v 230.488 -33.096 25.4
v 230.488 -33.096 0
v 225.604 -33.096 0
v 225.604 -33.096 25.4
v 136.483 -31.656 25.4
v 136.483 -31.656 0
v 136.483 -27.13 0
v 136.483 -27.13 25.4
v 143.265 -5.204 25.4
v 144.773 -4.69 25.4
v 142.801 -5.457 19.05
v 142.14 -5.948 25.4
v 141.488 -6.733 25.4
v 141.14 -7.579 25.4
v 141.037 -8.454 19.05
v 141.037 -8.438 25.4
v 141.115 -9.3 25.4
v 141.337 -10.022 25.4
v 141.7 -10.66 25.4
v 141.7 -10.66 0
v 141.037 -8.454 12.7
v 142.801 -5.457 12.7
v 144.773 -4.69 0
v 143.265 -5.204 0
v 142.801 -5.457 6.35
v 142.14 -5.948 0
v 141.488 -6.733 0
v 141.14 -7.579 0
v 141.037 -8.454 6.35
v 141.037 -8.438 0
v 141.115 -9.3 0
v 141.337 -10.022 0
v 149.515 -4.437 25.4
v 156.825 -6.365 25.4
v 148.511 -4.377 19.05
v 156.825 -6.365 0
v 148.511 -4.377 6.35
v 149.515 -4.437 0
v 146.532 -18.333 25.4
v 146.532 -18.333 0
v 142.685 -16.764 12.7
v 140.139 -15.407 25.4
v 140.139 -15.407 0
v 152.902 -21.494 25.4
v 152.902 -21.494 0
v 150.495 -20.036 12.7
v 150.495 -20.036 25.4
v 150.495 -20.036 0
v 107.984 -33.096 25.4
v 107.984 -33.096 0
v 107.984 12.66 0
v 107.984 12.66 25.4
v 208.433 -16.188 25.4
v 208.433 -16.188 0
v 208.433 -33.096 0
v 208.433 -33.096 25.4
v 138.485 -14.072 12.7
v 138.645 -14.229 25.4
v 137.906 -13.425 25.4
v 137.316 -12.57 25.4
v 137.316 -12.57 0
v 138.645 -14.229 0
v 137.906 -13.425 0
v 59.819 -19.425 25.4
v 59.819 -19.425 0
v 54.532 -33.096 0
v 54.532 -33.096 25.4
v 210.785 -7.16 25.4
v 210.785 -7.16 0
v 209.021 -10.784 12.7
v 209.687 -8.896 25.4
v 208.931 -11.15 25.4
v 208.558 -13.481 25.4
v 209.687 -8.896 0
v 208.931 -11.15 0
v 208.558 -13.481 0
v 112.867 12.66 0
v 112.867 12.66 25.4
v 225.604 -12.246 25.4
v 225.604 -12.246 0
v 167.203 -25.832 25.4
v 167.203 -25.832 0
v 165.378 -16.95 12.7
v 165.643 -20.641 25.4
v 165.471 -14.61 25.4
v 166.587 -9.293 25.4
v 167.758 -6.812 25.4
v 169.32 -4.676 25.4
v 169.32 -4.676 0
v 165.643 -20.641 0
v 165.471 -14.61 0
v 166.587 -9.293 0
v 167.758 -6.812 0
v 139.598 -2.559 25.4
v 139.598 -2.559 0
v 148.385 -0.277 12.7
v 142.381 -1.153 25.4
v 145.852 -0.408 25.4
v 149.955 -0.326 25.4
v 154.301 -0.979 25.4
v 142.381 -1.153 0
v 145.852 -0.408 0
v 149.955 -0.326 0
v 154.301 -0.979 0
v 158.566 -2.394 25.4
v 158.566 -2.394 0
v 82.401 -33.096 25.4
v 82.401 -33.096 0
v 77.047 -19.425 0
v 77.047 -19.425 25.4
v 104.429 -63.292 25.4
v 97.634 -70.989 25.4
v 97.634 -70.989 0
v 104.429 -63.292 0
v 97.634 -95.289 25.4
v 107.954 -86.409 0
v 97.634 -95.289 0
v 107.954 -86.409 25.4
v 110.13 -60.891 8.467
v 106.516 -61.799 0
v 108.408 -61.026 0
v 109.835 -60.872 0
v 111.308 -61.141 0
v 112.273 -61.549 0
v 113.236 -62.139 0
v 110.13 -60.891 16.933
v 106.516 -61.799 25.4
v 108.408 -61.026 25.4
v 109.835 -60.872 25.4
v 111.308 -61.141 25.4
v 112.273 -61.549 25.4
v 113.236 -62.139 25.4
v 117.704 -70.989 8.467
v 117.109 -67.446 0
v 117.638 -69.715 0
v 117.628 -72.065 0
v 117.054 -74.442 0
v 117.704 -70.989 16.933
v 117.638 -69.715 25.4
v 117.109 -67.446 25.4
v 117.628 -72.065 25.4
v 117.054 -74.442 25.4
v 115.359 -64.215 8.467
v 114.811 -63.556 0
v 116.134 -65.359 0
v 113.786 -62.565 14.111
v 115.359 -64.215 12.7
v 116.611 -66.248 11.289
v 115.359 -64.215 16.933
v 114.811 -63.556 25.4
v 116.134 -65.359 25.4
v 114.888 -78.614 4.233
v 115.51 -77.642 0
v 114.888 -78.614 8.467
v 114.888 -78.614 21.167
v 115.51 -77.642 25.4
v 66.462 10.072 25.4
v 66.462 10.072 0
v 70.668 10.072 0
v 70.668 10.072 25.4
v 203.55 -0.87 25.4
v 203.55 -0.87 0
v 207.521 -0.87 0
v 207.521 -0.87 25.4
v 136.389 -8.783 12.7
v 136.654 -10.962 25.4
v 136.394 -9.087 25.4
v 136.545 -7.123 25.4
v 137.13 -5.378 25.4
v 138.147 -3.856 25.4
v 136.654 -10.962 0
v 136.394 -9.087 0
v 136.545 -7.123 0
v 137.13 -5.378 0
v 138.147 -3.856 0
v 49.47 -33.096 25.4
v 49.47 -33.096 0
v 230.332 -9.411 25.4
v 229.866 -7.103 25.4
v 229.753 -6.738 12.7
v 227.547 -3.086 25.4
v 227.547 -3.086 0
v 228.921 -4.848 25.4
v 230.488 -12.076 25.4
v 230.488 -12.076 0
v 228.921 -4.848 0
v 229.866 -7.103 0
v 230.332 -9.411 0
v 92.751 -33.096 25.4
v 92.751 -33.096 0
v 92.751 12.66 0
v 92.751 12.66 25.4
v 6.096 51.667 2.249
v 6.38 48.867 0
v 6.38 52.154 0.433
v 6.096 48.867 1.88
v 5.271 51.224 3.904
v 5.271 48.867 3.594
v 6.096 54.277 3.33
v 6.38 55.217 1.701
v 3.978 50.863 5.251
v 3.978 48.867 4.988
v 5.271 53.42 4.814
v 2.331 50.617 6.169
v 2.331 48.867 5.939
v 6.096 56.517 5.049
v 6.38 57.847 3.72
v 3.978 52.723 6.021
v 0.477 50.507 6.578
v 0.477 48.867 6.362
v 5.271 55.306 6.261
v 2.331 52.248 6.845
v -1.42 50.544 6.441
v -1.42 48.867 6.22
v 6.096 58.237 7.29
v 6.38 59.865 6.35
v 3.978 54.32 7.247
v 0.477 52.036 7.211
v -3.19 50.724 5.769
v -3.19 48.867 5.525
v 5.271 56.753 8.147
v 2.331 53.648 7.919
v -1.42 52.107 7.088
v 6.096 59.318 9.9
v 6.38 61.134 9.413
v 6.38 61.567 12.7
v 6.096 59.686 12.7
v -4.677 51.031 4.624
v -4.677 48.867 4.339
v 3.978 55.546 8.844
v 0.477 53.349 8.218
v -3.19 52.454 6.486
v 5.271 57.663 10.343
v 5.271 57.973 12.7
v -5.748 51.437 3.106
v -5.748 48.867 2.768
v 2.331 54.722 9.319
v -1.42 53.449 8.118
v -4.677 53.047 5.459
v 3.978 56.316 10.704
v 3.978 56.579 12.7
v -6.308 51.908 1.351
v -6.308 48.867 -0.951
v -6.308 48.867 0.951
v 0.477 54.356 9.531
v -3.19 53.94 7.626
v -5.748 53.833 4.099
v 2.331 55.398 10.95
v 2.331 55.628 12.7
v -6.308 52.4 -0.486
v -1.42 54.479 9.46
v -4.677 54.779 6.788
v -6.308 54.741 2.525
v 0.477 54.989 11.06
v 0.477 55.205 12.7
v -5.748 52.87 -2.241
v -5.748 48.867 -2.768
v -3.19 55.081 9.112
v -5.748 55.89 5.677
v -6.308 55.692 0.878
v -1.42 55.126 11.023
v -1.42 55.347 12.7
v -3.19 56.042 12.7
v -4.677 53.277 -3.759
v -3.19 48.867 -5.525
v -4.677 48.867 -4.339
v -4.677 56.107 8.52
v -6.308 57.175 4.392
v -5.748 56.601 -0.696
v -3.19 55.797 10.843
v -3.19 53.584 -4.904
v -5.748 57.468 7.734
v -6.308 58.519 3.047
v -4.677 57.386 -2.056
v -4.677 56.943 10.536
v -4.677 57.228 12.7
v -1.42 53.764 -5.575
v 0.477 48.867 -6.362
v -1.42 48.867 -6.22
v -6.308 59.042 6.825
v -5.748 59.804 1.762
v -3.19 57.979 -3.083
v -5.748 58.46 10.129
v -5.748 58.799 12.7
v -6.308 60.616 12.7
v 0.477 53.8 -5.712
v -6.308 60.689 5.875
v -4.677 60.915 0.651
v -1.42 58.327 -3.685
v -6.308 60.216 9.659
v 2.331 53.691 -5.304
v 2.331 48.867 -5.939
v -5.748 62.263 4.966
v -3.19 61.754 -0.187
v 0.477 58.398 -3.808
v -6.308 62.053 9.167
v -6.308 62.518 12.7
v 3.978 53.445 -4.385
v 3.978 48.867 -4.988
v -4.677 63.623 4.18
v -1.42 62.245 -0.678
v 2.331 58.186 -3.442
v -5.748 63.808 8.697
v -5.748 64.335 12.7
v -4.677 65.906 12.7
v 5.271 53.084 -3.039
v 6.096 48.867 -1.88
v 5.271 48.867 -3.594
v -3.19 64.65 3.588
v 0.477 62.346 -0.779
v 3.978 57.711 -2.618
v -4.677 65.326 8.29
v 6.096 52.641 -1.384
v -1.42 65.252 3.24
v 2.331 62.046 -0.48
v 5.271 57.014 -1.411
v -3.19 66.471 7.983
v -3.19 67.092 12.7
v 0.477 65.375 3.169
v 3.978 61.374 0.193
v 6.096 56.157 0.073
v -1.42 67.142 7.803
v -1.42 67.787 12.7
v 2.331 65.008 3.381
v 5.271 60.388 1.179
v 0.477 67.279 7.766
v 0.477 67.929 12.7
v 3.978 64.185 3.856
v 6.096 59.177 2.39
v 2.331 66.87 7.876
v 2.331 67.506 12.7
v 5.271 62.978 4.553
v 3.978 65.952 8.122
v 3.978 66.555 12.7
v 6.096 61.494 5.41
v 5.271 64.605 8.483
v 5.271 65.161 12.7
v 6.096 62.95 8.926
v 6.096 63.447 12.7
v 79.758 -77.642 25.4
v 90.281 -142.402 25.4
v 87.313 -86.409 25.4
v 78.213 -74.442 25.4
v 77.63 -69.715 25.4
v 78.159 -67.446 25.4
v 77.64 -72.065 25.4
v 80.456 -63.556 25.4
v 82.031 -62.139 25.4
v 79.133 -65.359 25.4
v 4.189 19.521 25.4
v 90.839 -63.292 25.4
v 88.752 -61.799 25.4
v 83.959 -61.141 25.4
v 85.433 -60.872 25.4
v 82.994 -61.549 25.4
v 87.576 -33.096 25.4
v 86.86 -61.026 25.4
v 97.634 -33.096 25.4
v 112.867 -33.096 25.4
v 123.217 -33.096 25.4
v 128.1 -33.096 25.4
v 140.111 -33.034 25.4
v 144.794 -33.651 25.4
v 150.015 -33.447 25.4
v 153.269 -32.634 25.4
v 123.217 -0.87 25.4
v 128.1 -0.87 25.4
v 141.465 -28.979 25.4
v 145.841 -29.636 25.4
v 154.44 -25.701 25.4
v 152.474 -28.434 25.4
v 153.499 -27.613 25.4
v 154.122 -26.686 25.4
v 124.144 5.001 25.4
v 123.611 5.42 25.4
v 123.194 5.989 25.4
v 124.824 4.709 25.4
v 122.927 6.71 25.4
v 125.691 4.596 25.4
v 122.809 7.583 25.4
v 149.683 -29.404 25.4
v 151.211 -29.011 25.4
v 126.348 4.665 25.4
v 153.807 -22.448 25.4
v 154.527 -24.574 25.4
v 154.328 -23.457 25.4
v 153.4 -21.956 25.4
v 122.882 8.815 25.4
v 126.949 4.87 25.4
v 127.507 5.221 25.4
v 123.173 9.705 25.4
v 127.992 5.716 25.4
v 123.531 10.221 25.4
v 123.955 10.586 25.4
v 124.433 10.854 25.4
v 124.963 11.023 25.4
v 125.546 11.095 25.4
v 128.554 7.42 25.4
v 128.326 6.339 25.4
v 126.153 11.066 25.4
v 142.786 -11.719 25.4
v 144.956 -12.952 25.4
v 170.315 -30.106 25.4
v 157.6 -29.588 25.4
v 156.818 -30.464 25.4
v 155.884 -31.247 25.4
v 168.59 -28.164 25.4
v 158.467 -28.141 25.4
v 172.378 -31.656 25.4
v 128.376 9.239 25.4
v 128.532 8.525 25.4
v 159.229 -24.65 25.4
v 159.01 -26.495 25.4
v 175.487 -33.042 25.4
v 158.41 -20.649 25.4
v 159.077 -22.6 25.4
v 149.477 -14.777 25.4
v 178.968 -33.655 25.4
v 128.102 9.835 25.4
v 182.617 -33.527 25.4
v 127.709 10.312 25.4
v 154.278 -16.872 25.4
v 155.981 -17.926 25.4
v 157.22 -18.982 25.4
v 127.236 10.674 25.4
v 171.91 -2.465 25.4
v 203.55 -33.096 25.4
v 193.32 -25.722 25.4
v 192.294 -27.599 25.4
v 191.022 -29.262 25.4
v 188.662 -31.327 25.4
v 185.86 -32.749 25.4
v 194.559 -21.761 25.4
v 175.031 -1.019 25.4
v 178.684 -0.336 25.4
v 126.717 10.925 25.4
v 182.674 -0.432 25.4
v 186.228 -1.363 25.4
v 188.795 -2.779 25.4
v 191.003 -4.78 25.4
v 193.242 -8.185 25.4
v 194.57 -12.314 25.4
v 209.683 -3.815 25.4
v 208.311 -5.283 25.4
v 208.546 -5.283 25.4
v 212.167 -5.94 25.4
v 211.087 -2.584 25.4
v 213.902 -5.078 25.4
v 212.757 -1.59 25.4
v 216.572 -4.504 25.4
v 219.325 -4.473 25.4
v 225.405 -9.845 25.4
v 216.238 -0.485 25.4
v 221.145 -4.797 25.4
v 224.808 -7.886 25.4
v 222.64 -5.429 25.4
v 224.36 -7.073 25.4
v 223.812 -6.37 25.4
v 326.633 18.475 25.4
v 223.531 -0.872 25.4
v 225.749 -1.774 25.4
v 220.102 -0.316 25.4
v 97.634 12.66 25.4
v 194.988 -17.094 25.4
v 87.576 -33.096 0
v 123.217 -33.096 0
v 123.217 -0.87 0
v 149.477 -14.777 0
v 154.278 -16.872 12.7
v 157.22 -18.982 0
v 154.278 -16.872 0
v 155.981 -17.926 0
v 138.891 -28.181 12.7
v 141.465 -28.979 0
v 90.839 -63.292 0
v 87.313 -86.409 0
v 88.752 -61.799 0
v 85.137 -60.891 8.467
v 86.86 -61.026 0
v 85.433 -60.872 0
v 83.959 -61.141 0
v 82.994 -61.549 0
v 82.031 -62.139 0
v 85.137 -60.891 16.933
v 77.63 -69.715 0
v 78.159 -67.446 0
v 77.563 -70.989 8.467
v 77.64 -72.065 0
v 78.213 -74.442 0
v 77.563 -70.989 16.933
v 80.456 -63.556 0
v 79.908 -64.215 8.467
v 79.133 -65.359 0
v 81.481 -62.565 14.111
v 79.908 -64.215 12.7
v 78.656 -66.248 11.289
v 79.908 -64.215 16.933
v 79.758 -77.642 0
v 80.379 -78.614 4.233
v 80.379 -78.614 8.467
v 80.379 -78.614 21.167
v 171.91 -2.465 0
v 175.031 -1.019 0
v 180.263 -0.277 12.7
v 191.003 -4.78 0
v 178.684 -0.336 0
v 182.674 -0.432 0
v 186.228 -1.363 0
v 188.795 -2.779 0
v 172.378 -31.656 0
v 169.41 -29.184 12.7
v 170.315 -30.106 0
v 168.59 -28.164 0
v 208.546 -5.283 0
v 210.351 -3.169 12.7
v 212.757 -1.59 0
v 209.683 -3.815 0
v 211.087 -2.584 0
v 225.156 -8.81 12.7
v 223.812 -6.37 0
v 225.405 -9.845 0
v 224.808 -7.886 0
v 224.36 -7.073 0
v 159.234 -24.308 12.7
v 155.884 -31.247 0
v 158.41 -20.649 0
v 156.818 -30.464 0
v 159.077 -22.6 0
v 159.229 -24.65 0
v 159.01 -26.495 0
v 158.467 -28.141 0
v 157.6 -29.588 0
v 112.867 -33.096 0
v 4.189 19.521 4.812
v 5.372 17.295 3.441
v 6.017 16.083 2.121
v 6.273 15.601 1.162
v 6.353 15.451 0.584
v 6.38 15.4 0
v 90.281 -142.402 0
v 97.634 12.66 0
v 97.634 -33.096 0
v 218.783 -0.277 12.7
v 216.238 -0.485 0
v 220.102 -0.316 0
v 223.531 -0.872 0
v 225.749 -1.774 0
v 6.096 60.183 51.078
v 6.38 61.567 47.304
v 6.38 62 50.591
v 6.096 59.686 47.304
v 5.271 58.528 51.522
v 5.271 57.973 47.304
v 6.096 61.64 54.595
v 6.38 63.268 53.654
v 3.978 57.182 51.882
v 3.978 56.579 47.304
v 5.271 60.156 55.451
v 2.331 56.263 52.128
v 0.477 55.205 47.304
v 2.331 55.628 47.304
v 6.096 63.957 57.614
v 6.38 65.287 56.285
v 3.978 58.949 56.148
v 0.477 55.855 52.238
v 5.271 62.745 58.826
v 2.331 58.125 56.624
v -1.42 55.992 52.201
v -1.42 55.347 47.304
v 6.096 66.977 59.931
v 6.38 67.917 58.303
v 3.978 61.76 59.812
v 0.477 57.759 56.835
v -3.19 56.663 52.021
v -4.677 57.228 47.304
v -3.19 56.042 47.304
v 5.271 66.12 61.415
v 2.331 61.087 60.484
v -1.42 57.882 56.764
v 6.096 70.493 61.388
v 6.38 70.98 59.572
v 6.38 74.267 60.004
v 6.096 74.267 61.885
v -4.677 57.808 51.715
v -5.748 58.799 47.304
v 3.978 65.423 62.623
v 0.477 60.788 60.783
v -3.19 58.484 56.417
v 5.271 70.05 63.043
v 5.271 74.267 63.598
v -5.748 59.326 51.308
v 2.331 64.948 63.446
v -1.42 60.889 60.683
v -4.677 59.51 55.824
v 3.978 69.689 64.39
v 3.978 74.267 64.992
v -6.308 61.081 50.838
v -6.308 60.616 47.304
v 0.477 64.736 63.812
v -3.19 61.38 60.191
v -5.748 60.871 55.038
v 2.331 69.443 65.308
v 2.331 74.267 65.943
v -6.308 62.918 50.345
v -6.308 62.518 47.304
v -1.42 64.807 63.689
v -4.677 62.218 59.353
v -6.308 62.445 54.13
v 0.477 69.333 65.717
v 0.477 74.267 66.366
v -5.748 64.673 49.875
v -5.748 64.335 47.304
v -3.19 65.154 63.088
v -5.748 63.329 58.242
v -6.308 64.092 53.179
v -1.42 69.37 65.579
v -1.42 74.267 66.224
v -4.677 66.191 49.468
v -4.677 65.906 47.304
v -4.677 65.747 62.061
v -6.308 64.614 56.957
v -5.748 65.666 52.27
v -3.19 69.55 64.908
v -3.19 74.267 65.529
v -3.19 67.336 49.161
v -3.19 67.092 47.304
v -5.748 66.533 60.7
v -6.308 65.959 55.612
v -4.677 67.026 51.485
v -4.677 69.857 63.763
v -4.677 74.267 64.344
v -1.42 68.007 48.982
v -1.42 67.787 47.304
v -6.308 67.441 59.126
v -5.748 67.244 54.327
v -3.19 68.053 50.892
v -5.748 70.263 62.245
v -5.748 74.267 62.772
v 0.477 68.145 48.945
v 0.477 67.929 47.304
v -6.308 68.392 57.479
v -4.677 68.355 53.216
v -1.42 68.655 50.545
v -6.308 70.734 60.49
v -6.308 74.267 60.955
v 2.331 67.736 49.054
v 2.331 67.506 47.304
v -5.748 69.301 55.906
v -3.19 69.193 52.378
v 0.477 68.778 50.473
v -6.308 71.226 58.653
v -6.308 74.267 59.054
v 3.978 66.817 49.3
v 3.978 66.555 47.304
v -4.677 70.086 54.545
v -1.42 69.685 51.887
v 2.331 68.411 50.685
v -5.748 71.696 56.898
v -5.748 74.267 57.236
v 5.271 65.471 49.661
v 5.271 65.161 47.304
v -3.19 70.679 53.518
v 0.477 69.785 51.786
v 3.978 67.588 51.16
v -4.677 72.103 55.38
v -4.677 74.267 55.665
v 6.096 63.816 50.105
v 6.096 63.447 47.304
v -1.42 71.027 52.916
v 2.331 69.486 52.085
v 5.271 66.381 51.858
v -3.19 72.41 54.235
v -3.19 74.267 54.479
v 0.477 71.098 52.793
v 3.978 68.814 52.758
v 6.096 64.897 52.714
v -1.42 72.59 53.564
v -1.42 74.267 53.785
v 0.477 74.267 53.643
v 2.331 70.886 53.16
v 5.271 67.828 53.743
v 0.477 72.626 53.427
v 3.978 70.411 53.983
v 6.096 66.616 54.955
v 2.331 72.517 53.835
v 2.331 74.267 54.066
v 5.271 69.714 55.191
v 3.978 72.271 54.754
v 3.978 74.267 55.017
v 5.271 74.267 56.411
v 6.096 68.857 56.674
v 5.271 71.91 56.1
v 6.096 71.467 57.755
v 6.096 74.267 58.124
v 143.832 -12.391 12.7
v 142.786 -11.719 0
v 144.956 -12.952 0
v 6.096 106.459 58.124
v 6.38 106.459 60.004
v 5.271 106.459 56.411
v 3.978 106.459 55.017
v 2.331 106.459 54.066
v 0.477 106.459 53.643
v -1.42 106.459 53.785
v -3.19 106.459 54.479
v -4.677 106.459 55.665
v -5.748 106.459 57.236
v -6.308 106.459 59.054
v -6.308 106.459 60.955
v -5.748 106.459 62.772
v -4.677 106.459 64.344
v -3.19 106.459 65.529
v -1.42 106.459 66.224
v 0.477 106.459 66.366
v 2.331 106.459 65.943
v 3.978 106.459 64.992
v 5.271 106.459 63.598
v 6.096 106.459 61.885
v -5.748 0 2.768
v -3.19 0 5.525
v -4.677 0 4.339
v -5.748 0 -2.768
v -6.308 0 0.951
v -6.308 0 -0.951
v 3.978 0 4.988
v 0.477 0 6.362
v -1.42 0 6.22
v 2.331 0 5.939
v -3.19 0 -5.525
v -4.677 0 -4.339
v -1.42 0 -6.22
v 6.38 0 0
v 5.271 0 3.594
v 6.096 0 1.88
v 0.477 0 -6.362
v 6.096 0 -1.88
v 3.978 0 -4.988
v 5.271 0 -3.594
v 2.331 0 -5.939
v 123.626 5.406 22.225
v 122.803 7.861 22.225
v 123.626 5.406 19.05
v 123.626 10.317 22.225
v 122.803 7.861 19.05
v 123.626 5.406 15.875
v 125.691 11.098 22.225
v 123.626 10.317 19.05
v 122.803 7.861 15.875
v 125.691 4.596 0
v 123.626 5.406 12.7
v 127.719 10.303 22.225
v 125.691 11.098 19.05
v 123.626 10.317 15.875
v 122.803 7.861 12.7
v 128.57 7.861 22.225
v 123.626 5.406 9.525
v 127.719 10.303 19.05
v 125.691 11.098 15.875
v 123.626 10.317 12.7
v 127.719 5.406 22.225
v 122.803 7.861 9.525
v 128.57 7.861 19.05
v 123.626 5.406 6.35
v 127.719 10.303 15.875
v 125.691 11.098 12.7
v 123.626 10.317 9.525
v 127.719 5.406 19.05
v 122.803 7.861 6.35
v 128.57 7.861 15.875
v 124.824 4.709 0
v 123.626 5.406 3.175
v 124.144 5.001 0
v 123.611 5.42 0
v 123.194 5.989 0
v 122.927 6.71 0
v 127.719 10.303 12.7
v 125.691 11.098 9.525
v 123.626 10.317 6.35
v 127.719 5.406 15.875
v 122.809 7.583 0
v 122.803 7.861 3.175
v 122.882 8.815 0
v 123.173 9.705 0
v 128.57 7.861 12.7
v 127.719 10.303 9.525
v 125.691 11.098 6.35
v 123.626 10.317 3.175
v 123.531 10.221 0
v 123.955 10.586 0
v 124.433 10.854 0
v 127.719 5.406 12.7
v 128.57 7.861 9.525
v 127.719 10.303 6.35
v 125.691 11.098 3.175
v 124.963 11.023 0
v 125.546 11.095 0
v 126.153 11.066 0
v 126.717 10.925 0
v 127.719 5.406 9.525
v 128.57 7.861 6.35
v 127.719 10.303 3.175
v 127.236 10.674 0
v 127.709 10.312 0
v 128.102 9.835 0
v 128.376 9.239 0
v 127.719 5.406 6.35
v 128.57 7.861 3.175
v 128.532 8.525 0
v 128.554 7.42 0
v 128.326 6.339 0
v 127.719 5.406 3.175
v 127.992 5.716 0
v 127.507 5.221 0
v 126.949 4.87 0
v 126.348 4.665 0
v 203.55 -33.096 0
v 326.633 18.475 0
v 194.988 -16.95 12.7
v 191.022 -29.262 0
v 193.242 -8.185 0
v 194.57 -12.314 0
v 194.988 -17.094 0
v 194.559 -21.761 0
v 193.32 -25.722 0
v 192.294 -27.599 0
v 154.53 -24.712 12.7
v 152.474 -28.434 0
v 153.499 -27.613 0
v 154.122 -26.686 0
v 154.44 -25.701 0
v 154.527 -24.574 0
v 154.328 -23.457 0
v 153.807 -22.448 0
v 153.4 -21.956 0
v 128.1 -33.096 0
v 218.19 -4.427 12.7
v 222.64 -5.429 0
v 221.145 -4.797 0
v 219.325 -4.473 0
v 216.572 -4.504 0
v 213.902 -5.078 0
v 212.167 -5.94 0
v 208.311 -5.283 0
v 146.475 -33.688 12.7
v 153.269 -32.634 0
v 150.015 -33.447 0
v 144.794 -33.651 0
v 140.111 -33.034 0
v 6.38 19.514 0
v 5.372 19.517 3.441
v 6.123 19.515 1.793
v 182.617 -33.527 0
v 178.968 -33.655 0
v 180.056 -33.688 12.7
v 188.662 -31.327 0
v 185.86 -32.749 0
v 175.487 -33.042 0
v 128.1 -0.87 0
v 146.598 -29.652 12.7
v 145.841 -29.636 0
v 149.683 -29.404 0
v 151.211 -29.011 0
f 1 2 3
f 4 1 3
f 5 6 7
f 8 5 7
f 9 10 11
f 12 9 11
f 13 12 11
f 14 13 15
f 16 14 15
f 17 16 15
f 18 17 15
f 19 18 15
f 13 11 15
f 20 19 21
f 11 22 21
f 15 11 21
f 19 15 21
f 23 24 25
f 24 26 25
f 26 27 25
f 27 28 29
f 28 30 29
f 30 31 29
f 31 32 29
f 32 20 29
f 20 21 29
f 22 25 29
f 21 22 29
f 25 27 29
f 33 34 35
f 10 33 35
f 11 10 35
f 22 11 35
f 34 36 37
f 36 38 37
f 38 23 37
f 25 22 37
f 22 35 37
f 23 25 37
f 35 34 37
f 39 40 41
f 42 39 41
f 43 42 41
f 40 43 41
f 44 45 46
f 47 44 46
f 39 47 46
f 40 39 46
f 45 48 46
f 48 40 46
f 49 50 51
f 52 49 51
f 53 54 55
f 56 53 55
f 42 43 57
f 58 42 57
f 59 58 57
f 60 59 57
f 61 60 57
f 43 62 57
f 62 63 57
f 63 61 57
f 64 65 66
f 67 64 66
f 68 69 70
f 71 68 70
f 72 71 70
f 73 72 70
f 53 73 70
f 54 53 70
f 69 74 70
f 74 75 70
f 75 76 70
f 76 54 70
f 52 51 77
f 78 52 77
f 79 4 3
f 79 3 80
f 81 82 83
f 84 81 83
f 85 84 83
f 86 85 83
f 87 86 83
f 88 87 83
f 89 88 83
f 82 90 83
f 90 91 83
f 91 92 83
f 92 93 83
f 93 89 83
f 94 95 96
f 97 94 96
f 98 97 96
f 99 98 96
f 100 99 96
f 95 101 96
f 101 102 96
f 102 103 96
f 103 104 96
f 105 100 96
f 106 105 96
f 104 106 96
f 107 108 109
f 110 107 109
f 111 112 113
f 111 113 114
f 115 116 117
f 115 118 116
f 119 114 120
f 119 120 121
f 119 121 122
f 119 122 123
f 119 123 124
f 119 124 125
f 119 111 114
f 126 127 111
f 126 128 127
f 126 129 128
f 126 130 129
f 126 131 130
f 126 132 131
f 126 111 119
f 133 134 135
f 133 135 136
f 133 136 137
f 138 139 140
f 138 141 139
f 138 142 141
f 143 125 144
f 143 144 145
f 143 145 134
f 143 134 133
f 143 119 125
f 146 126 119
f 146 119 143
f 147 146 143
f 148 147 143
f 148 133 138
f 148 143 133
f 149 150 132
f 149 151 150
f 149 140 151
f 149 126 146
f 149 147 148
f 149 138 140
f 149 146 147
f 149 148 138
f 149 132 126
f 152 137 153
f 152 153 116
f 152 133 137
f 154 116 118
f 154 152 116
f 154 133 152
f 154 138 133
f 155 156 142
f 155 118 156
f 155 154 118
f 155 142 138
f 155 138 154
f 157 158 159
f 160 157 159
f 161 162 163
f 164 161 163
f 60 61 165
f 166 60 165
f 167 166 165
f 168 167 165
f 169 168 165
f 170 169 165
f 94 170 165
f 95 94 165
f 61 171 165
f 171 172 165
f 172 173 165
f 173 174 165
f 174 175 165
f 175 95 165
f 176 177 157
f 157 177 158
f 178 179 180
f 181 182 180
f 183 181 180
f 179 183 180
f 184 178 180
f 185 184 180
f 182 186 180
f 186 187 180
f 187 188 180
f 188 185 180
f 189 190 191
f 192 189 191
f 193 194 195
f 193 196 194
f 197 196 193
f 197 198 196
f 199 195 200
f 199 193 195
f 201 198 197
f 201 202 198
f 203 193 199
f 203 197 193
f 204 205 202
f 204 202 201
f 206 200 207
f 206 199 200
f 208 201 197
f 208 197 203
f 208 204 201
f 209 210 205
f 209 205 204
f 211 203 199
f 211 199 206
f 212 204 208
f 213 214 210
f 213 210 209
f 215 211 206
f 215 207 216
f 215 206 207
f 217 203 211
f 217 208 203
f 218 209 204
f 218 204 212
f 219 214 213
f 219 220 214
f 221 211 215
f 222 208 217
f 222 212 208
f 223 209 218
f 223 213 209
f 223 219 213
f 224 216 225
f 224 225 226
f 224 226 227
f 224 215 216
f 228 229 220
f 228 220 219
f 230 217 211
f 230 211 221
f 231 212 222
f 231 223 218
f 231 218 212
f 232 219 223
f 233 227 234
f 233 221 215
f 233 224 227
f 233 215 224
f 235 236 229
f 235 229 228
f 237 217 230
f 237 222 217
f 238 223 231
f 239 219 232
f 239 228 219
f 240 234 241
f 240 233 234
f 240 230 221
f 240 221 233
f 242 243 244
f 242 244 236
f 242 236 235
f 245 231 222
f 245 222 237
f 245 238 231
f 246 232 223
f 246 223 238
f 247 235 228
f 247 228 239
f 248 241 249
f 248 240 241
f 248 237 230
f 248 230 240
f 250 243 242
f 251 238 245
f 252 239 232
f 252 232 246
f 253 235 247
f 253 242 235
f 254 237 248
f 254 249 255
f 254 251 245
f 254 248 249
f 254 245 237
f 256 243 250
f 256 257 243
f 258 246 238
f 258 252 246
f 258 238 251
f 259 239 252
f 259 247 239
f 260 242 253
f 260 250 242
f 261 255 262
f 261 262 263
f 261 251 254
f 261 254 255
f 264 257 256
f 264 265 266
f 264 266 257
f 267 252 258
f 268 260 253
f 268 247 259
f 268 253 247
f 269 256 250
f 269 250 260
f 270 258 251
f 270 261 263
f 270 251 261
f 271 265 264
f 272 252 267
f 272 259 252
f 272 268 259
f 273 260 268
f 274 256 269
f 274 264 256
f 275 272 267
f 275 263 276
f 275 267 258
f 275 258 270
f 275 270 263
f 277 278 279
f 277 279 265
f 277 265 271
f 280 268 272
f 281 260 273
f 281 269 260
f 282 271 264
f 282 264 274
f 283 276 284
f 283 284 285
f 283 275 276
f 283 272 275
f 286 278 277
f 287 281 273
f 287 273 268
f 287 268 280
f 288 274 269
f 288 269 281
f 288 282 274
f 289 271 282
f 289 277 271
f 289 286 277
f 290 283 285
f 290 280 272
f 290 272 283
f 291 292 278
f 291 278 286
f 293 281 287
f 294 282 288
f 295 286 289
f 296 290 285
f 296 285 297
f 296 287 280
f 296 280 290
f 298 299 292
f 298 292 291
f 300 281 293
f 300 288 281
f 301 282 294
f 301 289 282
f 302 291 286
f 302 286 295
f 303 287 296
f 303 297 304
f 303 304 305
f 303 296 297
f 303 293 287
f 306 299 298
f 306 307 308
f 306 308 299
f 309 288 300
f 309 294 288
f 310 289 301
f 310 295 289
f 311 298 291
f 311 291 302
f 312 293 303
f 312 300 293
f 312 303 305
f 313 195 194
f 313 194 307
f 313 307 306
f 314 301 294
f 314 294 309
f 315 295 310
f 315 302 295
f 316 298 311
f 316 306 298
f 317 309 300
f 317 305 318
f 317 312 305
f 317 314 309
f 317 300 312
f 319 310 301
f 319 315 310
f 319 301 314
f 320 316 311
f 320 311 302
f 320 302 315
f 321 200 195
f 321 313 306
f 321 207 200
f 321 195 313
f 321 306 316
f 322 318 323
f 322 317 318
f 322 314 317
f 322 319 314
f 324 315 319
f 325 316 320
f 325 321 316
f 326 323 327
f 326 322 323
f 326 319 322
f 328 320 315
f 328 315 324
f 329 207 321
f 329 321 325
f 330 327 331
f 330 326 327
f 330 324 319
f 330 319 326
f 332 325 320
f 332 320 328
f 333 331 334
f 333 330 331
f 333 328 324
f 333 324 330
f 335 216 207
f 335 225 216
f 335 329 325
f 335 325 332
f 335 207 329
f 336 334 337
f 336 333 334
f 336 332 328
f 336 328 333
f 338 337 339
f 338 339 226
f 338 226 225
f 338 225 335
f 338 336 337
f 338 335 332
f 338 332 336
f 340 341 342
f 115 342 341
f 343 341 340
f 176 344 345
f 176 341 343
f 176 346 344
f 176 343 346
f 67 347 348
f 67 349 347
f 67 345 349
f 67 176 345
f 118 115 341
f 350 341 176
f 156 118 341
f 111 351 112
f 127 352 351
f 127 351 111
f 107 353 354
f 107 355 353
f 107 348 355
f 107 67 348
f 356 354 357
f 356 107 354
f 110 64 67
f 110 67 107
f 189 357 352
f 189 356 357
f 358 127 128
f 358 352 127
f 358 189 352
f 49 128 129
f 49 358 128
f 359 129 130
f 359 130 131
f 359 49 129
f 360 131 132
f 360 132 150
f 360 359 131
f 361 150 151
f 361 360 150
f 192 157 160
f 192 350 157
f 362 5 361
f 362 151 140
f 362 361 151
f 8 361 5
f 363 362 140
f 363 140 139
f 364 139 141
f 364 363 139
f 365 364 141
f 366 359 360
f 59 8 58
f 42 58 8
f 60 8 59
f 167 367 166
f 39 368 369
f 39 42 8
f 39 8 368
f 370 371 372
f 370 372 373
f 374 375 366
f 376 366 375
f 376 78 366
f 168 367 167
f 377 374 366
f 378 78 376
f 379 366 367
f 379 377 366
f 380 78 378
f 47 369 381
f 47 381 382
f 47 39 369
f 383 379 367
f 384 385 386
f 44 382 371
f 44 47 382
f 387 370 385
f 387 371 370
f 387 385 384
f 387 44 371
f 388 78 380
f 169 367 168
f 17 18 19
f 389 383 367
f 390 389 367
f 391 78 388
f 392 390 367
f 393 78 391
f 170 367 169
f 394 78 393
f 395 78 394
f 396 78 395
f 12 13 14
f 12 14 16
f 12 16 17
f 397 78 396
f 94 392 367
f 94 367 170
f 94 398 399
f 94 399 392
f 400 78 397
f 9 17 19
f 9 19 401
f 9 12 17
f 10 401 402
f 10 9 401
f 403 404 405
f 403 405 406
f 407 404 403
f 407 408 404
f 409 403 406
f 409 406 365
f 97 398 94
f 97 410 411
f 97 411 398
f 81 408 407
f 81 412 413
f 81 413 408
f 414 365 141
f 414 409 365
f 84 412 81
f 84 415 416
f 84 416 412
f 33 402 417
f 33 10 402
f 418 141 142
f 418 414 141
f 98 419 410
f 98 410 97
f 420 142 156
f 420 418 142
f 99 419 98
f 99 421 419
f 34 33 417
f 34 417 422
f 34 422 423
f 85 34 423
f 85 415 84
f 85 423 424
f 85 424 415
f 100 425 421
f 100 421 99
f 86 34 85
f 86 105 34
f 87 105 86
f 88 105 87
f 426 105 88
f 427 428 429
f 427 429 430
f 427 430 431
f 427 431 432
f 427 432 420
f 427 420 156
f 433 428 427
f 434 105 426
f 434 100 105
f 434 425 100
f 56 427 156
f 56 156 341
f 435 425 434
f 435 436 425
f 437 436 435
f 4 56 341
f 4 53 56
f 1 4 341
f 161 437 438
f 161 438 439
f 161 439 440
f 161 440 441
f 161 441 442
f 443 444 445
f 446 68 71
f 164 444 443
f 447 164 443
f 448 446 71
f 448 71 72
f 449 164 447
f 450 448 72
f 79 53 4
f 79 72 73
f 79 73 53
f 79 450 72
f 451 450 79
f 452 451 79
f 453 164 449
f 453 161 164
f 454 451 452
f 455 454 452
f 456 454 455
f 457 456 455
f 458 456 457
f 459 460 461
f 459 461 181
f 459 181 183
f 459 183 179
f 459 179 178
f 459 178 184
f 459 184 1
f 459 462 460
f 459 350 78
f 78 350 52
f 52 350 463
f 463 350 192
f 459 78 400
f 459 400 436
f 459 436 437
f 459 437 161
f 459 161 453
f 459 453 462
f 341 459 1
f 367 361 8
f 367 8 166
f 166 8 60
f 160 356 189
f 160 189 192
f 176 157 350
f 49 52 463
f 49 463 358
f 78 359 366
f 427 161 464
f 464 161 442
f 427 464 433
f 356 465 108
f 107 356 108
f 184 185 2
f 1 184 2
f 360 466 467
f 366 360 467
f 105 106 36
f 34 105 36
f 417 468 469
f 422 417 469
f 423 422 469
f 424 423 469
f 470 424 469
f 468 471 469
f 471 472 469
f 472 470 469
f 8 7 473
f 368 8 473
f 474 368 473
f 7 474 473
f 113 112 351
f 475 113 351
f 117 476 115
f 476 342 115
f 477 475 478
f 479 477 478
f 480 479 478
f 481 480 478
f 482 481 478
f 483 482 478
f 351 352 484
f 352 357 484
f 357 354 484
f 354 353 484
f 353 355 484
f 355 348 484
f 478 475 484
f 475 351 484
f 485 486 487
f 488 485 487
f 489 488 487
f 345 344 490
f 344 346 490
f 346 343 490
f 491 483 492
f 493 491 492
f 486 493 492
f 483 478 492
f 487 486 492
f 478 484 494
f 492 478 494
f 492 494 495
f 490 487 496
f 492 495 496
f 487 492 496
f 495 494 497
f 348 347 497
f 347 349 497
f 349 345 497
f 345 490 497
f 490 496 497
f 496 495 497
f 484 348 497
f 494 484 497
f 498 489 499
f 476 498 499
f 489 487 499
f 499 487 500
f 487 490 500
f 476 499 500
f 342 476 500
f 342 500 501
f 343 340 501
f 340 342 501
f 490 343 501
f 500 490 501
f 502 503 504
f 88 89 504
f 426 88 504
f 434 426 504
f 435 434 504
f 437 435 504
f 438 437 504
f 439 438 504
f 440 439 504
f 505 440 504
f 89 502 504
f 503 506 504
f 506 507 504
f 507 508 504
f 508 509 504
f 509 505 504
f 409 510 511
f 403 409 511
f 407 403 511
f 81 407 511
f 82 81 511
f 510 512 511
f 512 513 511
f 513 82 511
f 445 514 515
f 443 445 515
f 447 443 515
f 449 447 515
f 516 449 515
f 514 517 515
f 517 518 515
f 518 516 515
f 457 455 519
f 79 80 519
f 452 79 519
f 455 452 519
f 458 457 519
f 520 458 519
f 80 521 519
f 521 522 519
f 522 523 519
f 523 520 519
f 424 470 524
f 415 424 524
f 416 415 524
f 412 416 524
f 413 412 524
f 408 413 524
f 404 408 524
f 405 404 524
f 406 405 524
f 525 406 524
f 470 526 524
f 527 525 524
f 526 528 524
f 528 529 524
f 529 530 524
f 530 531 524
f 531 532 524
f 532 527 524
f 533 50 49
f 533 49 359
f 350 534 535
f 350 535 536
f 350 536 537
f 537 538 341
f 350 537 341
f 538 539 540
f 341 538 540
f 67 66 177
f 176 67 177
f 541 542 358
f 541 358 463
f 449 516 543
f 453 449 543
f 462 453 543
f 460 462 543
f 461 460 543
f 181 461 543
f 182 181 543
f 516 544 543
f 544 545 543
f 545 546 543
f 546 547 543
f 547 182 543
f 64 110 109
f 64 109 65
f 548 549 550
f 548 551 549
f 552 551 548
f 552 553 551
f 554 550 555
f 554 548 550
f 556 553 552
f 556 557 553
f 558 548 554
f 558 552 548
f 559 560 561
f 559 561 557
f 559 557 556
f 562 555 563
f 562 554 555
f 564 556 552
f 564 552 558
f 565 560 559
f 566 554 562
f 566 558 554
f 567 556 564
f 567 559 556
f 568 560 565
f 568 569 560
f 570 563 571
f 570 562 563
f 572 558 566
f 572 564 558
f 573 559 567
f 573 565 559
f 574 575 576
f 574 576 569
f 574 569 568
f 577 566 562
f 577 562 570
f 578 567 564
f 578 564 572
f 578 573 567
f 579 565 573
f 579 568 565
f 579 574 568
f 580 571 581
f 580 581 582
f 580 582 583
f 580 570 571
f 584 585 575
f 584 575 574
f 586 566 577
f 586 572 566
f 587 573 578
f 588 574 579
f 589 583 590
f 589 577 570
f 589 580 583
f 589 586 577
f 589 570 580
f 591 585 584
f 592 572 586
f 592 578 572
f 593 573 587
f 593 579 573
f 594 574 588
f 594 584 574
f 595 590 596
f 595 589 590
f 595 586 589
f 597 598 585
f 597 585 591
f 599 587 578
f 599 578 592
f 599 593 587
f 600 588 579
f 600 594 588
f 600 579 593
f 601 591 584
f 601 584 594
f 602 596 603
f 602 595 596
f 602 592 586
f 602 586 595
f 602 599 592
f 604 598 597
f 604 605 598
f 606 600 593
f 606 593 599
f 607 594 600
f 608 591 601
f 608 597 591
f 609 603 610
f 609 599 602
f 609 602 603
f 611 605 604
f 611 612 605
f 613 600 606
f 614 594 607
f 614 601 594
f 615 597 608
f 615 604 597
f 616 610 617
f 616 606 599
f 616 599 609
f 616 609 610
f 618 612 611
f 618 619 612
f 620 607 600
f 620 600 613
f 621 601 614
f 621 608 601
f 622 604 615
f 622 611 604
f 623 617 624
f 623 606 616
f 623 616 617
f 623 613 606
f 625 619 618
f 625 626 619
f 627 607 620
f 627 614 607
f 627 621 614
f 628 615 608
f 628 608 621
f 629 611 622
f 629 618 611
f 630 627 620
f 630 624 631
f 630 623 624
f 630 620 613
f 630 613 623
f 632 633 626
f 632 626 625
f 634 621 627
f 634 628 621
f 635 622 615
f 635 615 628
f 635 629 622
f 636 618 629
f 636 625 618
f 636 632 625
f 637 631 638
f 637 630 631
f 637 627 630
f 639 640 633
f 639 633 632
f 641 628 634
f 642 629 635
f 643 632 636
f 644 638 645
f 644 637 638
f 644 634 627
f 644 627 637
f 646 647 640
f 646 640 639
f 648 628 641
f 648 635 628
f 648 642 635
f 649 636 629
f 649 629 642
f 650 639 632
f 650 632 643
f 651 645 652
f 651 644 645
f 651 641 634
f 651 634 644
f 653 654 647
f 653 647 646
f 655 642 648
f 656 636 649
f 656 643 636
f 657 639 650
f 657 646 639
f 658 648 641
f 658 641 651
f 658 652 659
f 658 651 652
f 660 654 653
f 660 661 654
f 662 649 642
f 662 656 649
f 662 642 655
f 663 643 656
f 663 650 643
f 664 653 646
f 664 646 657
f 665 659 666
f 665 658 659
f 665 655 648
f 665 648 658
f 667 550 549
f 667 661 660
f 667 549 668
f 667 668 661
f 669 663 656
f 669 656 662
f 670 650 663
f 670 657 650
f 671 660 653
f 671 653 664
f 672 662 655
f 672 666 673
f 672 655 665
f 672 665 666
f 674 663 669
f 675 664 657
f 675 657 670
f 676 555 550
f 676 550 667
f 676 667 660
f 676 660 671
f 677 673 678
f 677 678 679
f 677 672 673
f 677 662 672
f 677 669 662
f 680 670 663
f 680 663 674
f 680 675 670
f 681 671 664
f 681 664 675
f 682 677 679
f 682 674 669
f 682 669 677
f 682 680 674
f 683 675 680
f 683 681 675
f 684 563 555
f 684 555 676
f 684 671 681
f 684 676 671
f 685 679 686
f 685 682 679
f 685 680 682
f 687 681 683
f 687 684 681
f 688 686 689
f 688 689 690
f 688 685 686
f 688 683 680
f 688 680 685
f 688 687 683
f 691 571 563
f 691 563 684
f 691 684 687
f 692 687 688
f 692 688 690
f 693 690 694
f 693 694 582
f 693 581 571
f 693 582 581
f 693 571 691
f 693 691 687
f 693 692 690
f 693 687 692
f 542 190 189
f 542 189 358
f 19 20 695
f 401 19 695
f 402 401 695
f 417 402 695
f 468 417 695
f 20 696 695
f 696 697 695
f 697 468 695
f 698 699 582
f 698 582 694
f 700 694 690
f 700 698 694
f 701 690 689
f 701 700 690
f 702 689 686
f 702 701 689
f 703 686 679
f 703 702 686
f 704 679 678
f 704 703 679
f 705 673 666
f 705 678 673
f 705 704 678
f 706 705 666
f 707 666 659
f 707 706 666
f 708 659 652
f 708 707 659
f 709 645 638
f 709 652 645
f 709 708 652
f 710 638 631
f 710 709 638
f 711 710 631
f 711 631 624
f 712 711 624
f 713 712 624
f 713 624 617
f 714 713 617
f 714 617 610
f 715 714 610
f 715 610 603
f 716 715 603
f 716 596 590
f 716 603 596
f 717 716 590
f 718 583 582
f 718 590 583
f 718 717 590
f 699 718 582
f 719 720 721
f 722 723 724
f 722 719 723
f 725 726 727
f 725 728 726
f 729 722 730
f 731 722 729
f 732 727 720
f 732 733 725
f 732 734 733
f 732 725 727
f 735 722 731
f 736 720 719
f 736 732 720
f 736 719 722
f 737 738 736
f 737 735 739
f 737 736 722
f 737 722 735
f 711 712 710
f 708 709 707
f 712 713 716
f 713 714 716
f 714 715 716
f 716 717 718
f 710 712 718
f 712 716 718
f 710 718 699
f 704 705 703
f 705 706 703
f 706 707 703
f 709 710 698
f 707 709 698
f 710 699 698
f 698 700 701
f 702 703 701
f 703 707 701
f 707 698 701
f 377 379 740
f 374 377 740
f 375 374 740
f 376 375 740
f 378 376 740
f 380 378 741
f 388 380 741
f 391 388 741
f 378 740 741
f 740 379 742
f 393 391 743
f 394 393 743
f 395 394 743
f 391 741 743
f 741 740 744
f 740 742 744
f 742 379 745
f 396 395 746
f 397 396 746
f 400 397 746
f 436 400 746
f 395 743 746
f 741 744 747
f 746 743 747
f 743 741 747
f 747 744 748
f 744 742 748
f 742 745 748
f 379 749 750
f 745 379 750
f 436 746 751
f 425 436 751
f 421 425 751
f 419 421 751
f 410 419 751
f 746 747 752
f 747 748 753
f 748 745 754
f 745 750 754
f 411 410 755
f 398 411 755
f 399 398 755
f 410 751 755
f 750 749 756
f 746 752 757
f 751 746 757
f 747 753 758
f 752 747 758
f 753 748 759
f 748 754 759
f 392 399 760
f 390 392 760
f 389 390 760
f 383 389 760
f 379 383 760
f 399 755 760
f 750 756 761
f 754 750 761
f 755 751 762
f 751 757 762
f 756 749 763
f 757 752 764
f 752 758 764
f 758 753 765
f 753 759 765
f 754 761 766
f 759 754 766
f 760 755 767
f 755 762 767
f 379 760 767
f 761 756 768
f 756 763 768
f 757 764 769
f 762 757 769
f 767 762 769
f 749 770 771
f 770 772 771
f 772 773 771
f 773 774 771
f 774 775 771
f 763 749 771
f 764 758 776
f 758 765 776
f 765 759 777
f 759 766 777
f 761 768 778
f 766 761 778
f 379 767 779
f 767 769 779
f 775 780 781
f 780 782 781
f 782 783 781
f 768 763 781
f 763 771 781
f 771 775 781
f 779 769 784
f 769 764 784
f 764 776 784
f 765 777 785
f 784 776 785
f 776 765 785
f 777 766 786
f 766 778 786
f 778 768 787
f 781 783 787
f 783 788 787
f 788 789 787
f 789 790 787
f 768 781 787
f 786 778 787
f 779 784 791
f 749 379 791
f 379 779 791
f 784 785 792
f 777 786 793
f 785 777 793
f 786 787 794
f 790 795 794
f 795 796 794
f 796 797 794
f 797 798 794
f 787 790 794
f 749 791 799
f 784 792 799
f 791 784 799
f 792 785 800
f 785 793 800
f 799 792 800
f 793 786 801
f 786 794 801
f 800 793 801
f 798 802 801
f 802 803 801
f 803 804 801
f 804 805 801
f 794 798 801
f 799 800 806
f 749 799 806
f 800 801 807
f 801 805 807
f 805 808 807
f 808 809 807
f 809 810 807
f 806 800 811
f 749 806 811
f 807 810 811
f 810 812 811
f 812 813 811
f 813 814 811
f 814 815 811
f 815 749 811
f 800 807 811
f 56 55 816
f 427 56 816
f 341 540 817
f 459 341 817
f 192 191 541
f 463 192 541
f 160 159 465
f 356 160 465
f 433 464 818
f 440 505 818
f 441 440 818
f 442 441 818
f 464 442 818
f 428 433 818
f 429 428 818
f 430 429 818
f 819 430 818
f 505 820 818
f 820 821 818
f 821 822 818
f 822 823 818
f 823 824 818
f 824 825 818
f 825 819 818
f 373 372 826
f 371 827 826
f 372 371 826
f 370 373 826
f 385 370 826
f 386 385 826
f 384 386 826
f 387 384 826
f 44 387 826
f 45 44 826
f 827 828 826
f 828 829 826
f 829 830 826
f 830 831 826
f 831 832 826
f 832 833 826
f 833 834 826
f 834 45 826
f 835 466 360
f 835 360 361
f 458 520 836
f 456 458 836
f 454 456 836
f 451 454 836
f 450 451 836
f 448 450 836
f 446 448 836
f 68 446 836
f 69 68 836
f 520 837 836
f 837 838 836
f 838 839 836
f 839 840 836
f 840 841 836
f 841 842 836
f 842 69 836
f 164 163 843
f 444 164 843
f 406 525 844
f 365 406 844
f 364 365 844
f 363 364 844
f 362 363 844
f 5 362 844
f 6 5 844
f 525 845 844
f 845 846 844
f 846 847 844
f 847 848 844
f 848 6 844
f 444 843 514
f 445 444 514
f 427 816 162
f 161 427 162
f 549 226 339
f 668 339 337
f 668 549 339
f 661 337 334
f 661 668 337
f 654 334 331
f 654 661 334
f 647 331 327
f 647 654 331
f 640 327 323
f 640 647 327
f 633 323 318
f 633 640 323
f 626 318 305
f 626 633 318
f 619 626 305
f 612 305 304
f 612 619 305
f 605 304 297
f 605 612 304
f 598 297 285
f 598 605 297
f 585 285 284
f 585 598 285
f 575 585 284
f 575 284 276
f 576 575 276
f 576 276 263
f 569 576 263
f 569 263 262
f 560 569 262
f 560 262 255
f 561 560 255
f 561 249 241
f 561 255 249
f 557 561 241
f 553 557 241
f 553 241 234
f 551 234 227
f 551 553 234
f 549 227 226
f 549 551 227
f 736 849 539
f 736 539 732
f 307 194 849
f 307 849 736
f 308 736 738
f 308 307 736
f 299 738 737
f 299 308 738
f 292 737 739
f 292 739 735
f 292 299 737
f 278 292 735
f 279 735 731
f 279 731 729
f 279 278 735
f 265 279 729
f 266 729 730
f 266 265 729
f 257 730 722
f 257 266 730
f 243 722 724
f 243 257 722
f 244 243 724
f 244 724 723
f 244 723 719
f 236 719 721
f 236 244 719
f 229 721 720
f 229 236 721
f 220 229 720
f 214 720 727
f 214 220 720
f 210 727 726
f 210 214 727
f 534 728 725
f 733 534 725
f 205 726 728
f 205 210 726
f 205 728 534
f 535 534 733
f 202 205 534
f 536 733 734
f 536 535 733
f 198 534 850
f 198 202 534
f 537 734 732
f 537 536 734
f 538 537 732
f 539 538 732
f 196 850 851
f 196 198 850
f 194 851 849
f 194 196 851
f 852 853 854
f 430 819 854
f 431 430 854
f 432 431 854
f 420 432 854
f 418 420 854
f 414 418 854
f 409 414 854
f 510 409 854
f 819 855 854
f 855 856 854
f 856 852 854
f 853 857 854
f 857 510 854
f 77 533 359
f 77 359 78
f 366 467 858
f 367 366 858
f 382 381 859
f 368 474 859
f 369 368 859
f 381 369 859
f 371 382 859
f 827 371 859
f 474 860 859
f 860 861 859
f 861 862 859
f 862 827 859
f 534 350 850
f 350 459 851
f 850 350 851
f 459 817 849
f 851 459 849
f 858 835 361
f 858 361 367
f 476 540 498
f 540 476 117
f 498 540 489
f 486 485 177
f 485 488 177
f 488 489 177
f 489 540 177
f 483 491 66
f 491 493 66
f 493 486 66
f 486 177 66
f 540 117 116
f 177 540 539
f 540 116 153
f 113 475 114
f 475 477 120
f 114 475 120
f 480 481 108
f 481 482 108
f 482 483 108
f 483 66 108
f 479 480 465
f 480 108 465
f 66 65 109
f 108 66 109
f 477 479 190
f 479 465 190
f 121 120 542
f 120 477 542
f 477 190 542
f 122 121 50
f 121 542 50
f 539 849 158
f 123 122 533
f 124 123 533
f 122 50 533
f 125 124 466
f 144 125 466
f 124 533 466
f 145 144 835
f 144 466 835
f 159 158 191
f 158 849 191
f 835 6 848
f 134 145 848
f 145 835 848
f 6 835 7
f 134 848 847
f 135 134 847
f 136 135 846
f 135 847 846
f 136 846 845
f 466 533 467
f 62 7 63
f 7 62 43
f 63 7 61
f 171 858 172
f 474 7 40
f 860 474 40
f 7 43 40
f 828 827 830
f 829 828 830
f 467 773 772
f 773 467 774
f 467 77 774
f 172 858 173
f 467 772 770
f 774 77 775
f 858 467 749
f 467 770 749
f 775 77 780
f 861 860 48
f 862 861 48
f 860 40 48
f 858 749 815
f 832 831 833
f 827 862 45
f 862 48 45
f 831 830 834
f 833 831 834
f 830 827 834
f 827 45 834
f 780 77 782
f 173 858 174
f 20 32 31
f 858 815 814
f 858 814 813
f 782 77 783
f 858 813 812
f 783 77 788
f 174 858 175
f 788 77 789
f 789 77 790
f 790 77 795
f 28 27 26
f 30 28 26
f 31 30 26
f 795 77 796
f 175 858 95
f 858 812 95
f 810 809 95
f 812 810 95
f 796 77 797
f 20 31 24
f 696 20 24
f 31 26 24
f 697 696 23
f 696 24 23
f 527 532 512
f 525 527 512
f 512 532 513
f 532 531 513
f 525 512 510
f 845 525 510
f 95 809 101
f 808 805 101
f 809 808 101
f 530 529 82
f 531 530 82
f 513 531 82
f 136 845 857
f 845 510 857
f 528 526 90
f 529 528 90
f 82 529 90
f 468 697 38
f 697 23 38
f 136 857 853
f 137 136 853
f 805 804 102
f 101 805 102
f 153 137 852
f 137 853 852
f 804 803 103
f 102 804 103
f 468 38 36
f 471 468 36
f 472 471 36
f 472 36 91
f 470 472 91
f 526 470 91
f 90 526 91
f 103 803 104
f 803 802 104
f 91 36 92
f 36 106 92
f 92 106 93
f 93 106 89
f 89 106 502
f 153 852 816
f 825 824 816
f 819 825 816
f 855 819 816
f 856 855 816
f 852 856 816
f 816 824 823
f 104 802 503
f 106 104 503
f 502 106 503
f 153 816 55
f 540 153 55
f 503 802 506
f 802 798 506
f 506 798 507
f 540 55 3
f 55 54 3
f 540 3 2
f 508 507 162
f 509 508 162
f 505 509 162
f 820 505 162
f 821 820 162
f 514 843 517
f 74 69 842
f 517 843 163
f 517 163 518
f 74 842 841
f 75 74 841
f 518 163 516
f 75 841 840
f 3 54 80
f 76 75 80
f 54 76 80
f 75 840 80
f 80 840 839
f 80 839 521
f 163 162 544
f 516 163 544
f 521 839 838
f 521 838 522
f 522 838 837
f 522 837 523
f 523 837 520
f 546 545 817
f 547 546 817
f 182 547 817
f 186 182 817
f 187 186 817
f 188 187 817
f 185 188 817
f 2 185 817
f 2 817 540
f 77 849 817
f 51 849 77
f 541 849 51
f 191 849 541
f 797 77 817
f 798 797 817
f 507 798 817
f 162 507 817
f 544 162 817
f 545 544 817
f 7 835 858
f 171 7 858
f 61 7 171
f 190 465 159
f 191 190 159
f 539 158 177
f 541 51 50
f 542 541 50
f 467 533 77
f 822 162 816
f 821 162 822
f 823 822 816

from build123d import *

# Parameters (mm, degrees)
F1_R     = 6.379673691
F3_W     = 4.8832285095
F3_H     = 45.7555688669
F3_H_2   = 32.2255445958
F4_DEPTH = 25.4
F6_DEPTH = 25.4


with BuildPart() as f2:
    # F2: sweep along a path in F0
    with BuildLine(Plane.YZ) as f2_path:
        Line((0, 0), (48.8668594837, 0))
        ThreePointArc((48.8668594837, 0), (57.8471156048, 3.7197438789), (61.5668594837, 12.7))
        Line((61.5668594837, 12.7), (61.5668594837, 47.304409945))
        ThreePointArc((61.5668594837, 47.304409945), (65.2866033626, 56.2846660661), (74.2668594837, 60.004409945))
        Line((74.2668594837, 60.004409945), (106.4591375947, 60.004409945))
    # F1 (on Front) → F2 (sweep)
    with BuildSketch(Plane.XZ):
        Circle(F1_R)
    sweep(path=f2_path.line)

    # F3 (on Top) → F4 (join)
    with BuildSketch(Plane.XY):
        Polygon((326.6327083111, 18.4751711786), (4.1886316997, 19.5212387724), (90.2807963532, -142.4016799862), align=None)
        Polygon((87.5756415589, -33.0956764519), (82.4007365874, -33.0956764519), (77.0470621713, -19.4245184088), (59.819333075, -19.4245184088), (54.5315210859, -33.0956764519), (49.4695231318, -33.0956764519), (66.4620292749, 10.0724399292), (70.6678156791, 10.0724399292), align=None, mode=Mode.SUBTRACT)
        with Locations((95.1921607853, -10.2178920185)):
            Rectangle(F3_W, F3_H, mode=Mode.SUBTRACT)
        with Locations((110.425199238, -10.2178920185)):
            Rectangle(F3_W, F3_H, mode=Mode.SUBTRACT)
        with Locations((125.6582376907, -16.982904154)):
            Rectangle(F3_W, F3_H_2, mode=Mode.SUBTRACT)
        with BuildLine():
            add(Edge.make_bspline(
                [(157.2204535583, -18.9822992567), (159.2339620381, -21.099305836), (159.2339620381, -24.3077469184)],
                knots=[0, 0, 0, 1, 1, 1], degree=2))
            add(Edge.make_bspline(
                [(159.2339620381, -24.3077469184), (159.2339620381, -28.8052097846), (155.8843871838, -31.2468240393)],
                knots=[0, 0, 0, 1, 1, 1], degree=2))
            add(Edge.make_bspline(
                [(155.8843871838, -31.2468240393), (152.5348123295, -33.6884382941), (146.4754690537, -33.6884382941)],
                knots=[0, 0, 0, 1, 1, 1], degree=2))
            add(Edge.make_bspline(
                [(146.4754690537, -33.6884382941), (140.067995807, -33.6884382941), (136.4831979994, -31.656111978)],
                knots=[0, 0, 0, 1, 1, 1], degree=2))
            Line((136.4831979994, -31.656111978), (136.4831979994, -27.1304223574))
            add(Edge.make_bspline(
                [(136.4831979994, -27.1304223574), (138.8072007776, -28.3065371237), (141.4652201494, -28.97927477)],
                knots=[0, 0, 0, 1, 1, 1], degree=2))
            add(Edge.make_bspline(
                [(141.4652201494, -28.97927477), (144.1232395211, -29.6520124163), (146.5977849894, -29.6520124163)],
                knots=[0, 0, 0, 1, 1, 1], degree=2))
            add(Edge.make_bspline(
                [(146.5977849894, -29.6520124163), (150.4178057502, -29.6520124163), (152.4736543616, -28.4335575184)],
                knots=[0, 0, 0, 1, 1, 1], degree=2))
            add(Edge.make_bspline(
                [(152.4736543616, -28.4335575184), (154.5295029731, -27.2151026206), (154.5295029731, -24.712330398)],
                knots=[0, 0, 0, 1, 1, 1], degree=2))
            add(Edge.make_bspline(
                [(154.5295029731, -24.712330398), (154.5295029731, -22.8305467719), (152.9017601366, -21.4944803975)],
                knots=[0, 0, 0, 1, 1, 1], degree=2))
            add(Edge.make_bspline(
                [(152.9017601366, -21.4944803975), (151.2740173, -20.158414023), (146.5319225624, -18.3330839057)],
                knots=[0, 0, 0, 1, 1, 1], degree=2))
            add(Edge.make_bspline(
                [(146.5319225624, -18.3330839057), (142.0344596962, -16.6582964786), (140.138562693, -15.4069103672)],
                knots=[0, 0, 0, 1, 1, 1], degree=2))
            add(Edge.make_bspline(
                [(140.138562693, -15.4069103672), (138.2426656898, -14.1555242559), (137.315887254, -12.570121551)],
                knots=[0, 0, 0, 1, 1, 1], degree=2))
            add(Edge.make_bspline(
                [(137.315887254, -12.570121551), (136.3891088181, -10.9847188461), (136.3891088181, -8.7830320036)],
                knots=[0, 0, 0, 1, 1, 1], degree=2))
            add(Edge.make_bspline(
                [(136.3891088181, -8.7830320036), (136.3891088181, -4.8406953071), (139.5975499005, -2.5590326605)],
                knots=[0, 0, 0, 1, 1, 1], degree=2))
            add(Edge.make_bspline(
                [(139.5975499005, -2.5590326605), (142.8059909829, -0.277370014), (148.3854794341, -0.277370014)],
                knots=[0, 0, 0, 1, 1, 1], degree=2))
            add(Edge.make_bspline(
                [(148.3854794341, -0.277370014), (153.5886111601, -0.277370014), (158.5659288509, -2.3943765933)],
                knots=[0, 0, 0, 1, 1, 1], degree=2))
            Line((158.5659288509, -2.3943765933), (156.8252789968, -6.3649400442))
            add(Edge.make_bspline(
                [(156.8252789968, -6.3649400442), (151.9796861598, -4.3702494006), (148.0373494633, -4.3702494006)],
                knots=[0, 0, 0, 1, 1, 1], degree=2))
            add(Edge.make_bspline(
                [(148.0373494633, -4.3702494006), (144.5654586732, -4.3702494006), (142.8012865238, -5.4569794446)],
                knots=[0, 0, 0, 1, 1, 1], degree=2))
            add(Edge.make_bspline(
                [(142.8012865238, -5.4569794446), (141.0371143744, -6.5437094886), (141.0371143744, -8.4537198691)],
                knots=[0, 0, 0, 1, 1, 1], degree=2))
            add(Edge.make_bspline(
                [(141.0371143744, -8.4537198691), (141.0371143744, -9.752150571), (141.7004431026, -10.6601111706)],
                knots=[0, 0, 0, 1, 1, 1], degree=2))
            add(Edge.make_bspline(
                [(141.7004431026, -10.6601111706), (142.3637718308, -11.5680717701), (143.8315630591, -12.3913521065)],
                knots=[0, 0, 0, 1, 1, 1], degree=2))
            add(Edge.make_bspline(
                [(143.8315630591, -12.3913521065), (145.2993542874, -13.2146324429), (149.4769139372, -14.7765128525)],
                knots=[0, 0, 0, 1, 1, 1], degree=2))
            add(Edge.make_bspline(
                [(149.4769139372, -14.7765128525), (155.2069450784, -16.8652926774), (157.2204535583, -18.9822992567)],
                knots=[0, 0, 0, 1, 1, 1], degree=2))
        make_face(mode=Mode.SUBTRACT)
        with BuildLine():
            add(Edge.make_bspline(
                [(123.6259113746, 5.4056165366), (122.8026310382, 6.2147834958), (122.8026310382, 7.8613441686)],
                knots=[0, 0, 0, 1, 1, 1], degree=2))
            add(Edge.make_bspline(
                [(122.8026310382, 7.8613441686), (122.8026310382, 9.5361315958), (123.6259113746, 10.3170718006)],
                knots=[0, 0, 0, 1, 1, 1], degree=2))
            add(Edge.make_bspline(
                [(123.6259113746, 10.3170718006), (124.449191711, 11.0980120054), (125.6911689042, 11.0980120054)],
                knots=[0, 0, 0, 1, 1, 1], degree=2))
            add(Edge.make_bspline(
                [(125.6911689042, 11.0980120054), (126.8672836704, 11.0980120054), (127.7187907612, 10.3029584234)],
                knots=[0, 0, 0, 1, 1, 1], degree=2))
            add(Edge.make_bspline(
                [(127.7187907612, 10.3029584234), (128.570297852, 9.5079048414), (128.570297852, 7.8613441686)],
                knots=[0, 0, 0, 1, 1, 1], degree=2))
            add(Edge.make_bspline(
                [(128.570297852, 7.8613441686), (128.570297852, 6.2147834958), (127.7187907612, 5.4056165366)],
                knots=[0, 0, 0, 1, 1, 1], degree=2))
            add(Edge.make_bspline(
                [(127.7187907612, 5.4056165366), (126.8672836704, 4.5964495774), (125.6911689042, 4.5964495774)],
                knots=[0, 0, 0, 1, 1, 1], degree=2))
            add(Edge.make_bspline(
                [(125.6911689042, 4.5964495774), (124.449191711, 4.5964495774), (123.6259113746, 5.4056165366)],
                knots=[0, 0, 0, 1, 1, 1], degree=2))
        make_face(mode=Mode.SUBTRACT)
        with BuildLine():
            add(Edge.make_bspline(
                [(191.0031741046, -4.7795373392), (194.9878509327, -9.2817046645), (194.9878509327, -16.9499729406)],
                knots=[0, 0, 0, 1, 1, 1], degree=2))
            add(Edge.make_bspline(
                [(194.9878509327, -16.9499729406), (194.9878509327, -24.8346463337), (191.0219919408, -29.2615423139)],
                knots=[0, 0, 0, 1, 1, 1], degree=2))
            add(Edge.make_bspline(
                [(191.0219919408, -29.2615423139), (187.056132949, -33.6884382941), (180.0558978602, -33.6884382941)],
                knots=[0, 0, 0, 1, 1, 1], degree=2))
            add(Edge.make_bspline(
                [(180.0558978602, -33.6884382941), (175.7277955203, -33.6884382941), (172.378220666, -31.656111978)],
                knots=[0, 0, 0, 1, 1, 1], degree=2))
            add(Edge.make_bspline(
                [(172.378220666, -31.656111978), (169.0286458116, -29.6237856619), (167.2033156944, -25.8319916554)],
                knots=[0, 0, 0, 1, 1, 1], degree=2))
            add(Edge.make_bspline(
                [(167.2033156944, -25.8319916554), (165.3779855771, -22.040197649), (165.3779855771, -16.9499729406)],
                knots=[0, 0, 0, 1, 1, 1], degree=2))
            add(Edge.make_bspline(
                [(165.3779855771, -16.9499729406), (165.3779855771, -9.0747084657), (169.3203222737, -4.6760392398)],
                knots=[0, 0, 0, 1, 1, 1], degree=2))
            add(Edge.make_bspline(
                [(169.3203222737, -4.6760392398), (173.2626589702, -0.277370014), (180.262894059, -0.277370014)],
                knots=[0, 0, 0, 1, 1, 1], degree=2))
            add(Edge.make_bspline(
                [(180.262894059, -0.277370014), (187.0184972765, -0.277370014), (191.0031741046, -4.7795373392)],
                knots=[0, 0, 0, 1, 1, 1], degree=2))
        make_face(mode=Mode.SUBTRACT)
        with BuildLine():
            Line((230.4876990377, -33.0956764519), (225.6044705282, -33.0956764519))
            Line((225.6044705282, -33.0956764519), (225.6044705282, -12.2455138755))
            add(Edge.make_bspline(
                [(225.6044705282, -12.2455138755), (225.6044705282, -8.3125860971), (223.8120716244, -6.3696445032)],
                knots=[0, 0, 0, 1, 1, 1], degree=2))
            add(Edge.make_bspline(
                [(223.8120716244, -6.3696445032), (222.0196727206, -4.4267029094), (218.1902430416, -4.4267029094)],
                knots=[0, 0, 0, 1, 1, 1], degree=2))
            add(Edge.make_bspline(
                [(218.1902430416, -4.4267029094), (213.1376540058, -4.4267029094), (210.7854244732, -7.1599936262)],
                knots=[0, 0, 0, 1, 1, 1], degree=2))
            add(Edge.make_bspline(
                [(210.7854244732, -7.1599936262), (208.4331949407, -9.893284343), (208.4331949407, -16.187850572)],
                knots=[0, 0, 0, 1, 1, 1], degree=2))
            Line((208.4331949407, -16.187850572), (208.4331949407, -33.0956764519))
            Line((208.4331949407, -33.0956764519), (203.5499664311, -33.0956764519))
            Line((203.5499664311, -33.0956764519), (203.5499664311, -0.8701318562))
            Line((203.5499664311, -0.8701318562), (207.5205298821, -0.8701318562))
            Line((207.5205298821, -0.8701318562), (208.310879005, -5.2829144592))
            Line((208.310879005, -5.2829144592), (208.5461019582, -5.2829144592))
            add(Edge.make_bspline(
                [(208.5461019582, -5.2829144592), (210.0515288591, -2.9024581723), (212.7565928215, -1.5899140931)],
                knots=[0, 0, 0, 1, 1, 1], degree=2))
            add(Edge.make_bspline(
                [(212.7565928215, -1.5899140931), (215.4616567839, -0.277370014), (218.7830048838, -0.277370014)],
                knots=[0, 0, 0, 1, 1, 1], degree=2))
            add(Edge.make_bspline(
                [(218.7830048838, -0.277370014), (224.6071252064, -0.277370014), (227.5474121221, -3.0859320758)],
                knots=[0, 0, 0, 1, 1, 1], degree=2))
            add(Edge.make_bspline(
                [(227.5474121221, -3.0859320758), (230.4876990377, -5.8944941377), (230.4876990377, -12.0761533492)],
                knots=[0, 0, 0, 1, 1, 1], degree=2))
            Line((230.4876990377, -12.0761533492), (230.4876990377, -33.0956764519))
        make_face(mode=Mode.SUBTRACT)
    extrude(amount=F4_DEPTH)

    # F5 (on face) → F6 (cut)
    with BuildSketch(Plane.XY.offset(25.4)):
        with BuildLine():
            add(Edge.make_bspline(
                [(97.6337750401, -70.9894448519), (101.7547711877, -65.7406254256), (109.5285345779, -55.8393591211), (123.9027278105, -73.6053108216), (107.611078169, -87.0535187852), (97.6337750401, -95.2894464135)],
                knots=[0, 0, 0, 0, 0.3042335189, 0.5738999278, 1, 1, 1, 1], degree=3))
            add(Edge.make_bspline(
                [(97.6337750401, -70.9894448519), (93.5127788924, -65.7406254256), (85.7390155022, -55.8393591211), (71.3648222696, -73.6053108216), (87.6564719111, -87.0535187852), (97.6337750401, -95.2894464135)],
                knots=[0, 0, 0, 0, 0.3042335189, 0.5738999278, 1, 1, 1, 1], degree=3))
        make_face()
    extrude(amount=-F6_DEPTH, mode=Mode.SUBTRACT)


solid = f2.part
